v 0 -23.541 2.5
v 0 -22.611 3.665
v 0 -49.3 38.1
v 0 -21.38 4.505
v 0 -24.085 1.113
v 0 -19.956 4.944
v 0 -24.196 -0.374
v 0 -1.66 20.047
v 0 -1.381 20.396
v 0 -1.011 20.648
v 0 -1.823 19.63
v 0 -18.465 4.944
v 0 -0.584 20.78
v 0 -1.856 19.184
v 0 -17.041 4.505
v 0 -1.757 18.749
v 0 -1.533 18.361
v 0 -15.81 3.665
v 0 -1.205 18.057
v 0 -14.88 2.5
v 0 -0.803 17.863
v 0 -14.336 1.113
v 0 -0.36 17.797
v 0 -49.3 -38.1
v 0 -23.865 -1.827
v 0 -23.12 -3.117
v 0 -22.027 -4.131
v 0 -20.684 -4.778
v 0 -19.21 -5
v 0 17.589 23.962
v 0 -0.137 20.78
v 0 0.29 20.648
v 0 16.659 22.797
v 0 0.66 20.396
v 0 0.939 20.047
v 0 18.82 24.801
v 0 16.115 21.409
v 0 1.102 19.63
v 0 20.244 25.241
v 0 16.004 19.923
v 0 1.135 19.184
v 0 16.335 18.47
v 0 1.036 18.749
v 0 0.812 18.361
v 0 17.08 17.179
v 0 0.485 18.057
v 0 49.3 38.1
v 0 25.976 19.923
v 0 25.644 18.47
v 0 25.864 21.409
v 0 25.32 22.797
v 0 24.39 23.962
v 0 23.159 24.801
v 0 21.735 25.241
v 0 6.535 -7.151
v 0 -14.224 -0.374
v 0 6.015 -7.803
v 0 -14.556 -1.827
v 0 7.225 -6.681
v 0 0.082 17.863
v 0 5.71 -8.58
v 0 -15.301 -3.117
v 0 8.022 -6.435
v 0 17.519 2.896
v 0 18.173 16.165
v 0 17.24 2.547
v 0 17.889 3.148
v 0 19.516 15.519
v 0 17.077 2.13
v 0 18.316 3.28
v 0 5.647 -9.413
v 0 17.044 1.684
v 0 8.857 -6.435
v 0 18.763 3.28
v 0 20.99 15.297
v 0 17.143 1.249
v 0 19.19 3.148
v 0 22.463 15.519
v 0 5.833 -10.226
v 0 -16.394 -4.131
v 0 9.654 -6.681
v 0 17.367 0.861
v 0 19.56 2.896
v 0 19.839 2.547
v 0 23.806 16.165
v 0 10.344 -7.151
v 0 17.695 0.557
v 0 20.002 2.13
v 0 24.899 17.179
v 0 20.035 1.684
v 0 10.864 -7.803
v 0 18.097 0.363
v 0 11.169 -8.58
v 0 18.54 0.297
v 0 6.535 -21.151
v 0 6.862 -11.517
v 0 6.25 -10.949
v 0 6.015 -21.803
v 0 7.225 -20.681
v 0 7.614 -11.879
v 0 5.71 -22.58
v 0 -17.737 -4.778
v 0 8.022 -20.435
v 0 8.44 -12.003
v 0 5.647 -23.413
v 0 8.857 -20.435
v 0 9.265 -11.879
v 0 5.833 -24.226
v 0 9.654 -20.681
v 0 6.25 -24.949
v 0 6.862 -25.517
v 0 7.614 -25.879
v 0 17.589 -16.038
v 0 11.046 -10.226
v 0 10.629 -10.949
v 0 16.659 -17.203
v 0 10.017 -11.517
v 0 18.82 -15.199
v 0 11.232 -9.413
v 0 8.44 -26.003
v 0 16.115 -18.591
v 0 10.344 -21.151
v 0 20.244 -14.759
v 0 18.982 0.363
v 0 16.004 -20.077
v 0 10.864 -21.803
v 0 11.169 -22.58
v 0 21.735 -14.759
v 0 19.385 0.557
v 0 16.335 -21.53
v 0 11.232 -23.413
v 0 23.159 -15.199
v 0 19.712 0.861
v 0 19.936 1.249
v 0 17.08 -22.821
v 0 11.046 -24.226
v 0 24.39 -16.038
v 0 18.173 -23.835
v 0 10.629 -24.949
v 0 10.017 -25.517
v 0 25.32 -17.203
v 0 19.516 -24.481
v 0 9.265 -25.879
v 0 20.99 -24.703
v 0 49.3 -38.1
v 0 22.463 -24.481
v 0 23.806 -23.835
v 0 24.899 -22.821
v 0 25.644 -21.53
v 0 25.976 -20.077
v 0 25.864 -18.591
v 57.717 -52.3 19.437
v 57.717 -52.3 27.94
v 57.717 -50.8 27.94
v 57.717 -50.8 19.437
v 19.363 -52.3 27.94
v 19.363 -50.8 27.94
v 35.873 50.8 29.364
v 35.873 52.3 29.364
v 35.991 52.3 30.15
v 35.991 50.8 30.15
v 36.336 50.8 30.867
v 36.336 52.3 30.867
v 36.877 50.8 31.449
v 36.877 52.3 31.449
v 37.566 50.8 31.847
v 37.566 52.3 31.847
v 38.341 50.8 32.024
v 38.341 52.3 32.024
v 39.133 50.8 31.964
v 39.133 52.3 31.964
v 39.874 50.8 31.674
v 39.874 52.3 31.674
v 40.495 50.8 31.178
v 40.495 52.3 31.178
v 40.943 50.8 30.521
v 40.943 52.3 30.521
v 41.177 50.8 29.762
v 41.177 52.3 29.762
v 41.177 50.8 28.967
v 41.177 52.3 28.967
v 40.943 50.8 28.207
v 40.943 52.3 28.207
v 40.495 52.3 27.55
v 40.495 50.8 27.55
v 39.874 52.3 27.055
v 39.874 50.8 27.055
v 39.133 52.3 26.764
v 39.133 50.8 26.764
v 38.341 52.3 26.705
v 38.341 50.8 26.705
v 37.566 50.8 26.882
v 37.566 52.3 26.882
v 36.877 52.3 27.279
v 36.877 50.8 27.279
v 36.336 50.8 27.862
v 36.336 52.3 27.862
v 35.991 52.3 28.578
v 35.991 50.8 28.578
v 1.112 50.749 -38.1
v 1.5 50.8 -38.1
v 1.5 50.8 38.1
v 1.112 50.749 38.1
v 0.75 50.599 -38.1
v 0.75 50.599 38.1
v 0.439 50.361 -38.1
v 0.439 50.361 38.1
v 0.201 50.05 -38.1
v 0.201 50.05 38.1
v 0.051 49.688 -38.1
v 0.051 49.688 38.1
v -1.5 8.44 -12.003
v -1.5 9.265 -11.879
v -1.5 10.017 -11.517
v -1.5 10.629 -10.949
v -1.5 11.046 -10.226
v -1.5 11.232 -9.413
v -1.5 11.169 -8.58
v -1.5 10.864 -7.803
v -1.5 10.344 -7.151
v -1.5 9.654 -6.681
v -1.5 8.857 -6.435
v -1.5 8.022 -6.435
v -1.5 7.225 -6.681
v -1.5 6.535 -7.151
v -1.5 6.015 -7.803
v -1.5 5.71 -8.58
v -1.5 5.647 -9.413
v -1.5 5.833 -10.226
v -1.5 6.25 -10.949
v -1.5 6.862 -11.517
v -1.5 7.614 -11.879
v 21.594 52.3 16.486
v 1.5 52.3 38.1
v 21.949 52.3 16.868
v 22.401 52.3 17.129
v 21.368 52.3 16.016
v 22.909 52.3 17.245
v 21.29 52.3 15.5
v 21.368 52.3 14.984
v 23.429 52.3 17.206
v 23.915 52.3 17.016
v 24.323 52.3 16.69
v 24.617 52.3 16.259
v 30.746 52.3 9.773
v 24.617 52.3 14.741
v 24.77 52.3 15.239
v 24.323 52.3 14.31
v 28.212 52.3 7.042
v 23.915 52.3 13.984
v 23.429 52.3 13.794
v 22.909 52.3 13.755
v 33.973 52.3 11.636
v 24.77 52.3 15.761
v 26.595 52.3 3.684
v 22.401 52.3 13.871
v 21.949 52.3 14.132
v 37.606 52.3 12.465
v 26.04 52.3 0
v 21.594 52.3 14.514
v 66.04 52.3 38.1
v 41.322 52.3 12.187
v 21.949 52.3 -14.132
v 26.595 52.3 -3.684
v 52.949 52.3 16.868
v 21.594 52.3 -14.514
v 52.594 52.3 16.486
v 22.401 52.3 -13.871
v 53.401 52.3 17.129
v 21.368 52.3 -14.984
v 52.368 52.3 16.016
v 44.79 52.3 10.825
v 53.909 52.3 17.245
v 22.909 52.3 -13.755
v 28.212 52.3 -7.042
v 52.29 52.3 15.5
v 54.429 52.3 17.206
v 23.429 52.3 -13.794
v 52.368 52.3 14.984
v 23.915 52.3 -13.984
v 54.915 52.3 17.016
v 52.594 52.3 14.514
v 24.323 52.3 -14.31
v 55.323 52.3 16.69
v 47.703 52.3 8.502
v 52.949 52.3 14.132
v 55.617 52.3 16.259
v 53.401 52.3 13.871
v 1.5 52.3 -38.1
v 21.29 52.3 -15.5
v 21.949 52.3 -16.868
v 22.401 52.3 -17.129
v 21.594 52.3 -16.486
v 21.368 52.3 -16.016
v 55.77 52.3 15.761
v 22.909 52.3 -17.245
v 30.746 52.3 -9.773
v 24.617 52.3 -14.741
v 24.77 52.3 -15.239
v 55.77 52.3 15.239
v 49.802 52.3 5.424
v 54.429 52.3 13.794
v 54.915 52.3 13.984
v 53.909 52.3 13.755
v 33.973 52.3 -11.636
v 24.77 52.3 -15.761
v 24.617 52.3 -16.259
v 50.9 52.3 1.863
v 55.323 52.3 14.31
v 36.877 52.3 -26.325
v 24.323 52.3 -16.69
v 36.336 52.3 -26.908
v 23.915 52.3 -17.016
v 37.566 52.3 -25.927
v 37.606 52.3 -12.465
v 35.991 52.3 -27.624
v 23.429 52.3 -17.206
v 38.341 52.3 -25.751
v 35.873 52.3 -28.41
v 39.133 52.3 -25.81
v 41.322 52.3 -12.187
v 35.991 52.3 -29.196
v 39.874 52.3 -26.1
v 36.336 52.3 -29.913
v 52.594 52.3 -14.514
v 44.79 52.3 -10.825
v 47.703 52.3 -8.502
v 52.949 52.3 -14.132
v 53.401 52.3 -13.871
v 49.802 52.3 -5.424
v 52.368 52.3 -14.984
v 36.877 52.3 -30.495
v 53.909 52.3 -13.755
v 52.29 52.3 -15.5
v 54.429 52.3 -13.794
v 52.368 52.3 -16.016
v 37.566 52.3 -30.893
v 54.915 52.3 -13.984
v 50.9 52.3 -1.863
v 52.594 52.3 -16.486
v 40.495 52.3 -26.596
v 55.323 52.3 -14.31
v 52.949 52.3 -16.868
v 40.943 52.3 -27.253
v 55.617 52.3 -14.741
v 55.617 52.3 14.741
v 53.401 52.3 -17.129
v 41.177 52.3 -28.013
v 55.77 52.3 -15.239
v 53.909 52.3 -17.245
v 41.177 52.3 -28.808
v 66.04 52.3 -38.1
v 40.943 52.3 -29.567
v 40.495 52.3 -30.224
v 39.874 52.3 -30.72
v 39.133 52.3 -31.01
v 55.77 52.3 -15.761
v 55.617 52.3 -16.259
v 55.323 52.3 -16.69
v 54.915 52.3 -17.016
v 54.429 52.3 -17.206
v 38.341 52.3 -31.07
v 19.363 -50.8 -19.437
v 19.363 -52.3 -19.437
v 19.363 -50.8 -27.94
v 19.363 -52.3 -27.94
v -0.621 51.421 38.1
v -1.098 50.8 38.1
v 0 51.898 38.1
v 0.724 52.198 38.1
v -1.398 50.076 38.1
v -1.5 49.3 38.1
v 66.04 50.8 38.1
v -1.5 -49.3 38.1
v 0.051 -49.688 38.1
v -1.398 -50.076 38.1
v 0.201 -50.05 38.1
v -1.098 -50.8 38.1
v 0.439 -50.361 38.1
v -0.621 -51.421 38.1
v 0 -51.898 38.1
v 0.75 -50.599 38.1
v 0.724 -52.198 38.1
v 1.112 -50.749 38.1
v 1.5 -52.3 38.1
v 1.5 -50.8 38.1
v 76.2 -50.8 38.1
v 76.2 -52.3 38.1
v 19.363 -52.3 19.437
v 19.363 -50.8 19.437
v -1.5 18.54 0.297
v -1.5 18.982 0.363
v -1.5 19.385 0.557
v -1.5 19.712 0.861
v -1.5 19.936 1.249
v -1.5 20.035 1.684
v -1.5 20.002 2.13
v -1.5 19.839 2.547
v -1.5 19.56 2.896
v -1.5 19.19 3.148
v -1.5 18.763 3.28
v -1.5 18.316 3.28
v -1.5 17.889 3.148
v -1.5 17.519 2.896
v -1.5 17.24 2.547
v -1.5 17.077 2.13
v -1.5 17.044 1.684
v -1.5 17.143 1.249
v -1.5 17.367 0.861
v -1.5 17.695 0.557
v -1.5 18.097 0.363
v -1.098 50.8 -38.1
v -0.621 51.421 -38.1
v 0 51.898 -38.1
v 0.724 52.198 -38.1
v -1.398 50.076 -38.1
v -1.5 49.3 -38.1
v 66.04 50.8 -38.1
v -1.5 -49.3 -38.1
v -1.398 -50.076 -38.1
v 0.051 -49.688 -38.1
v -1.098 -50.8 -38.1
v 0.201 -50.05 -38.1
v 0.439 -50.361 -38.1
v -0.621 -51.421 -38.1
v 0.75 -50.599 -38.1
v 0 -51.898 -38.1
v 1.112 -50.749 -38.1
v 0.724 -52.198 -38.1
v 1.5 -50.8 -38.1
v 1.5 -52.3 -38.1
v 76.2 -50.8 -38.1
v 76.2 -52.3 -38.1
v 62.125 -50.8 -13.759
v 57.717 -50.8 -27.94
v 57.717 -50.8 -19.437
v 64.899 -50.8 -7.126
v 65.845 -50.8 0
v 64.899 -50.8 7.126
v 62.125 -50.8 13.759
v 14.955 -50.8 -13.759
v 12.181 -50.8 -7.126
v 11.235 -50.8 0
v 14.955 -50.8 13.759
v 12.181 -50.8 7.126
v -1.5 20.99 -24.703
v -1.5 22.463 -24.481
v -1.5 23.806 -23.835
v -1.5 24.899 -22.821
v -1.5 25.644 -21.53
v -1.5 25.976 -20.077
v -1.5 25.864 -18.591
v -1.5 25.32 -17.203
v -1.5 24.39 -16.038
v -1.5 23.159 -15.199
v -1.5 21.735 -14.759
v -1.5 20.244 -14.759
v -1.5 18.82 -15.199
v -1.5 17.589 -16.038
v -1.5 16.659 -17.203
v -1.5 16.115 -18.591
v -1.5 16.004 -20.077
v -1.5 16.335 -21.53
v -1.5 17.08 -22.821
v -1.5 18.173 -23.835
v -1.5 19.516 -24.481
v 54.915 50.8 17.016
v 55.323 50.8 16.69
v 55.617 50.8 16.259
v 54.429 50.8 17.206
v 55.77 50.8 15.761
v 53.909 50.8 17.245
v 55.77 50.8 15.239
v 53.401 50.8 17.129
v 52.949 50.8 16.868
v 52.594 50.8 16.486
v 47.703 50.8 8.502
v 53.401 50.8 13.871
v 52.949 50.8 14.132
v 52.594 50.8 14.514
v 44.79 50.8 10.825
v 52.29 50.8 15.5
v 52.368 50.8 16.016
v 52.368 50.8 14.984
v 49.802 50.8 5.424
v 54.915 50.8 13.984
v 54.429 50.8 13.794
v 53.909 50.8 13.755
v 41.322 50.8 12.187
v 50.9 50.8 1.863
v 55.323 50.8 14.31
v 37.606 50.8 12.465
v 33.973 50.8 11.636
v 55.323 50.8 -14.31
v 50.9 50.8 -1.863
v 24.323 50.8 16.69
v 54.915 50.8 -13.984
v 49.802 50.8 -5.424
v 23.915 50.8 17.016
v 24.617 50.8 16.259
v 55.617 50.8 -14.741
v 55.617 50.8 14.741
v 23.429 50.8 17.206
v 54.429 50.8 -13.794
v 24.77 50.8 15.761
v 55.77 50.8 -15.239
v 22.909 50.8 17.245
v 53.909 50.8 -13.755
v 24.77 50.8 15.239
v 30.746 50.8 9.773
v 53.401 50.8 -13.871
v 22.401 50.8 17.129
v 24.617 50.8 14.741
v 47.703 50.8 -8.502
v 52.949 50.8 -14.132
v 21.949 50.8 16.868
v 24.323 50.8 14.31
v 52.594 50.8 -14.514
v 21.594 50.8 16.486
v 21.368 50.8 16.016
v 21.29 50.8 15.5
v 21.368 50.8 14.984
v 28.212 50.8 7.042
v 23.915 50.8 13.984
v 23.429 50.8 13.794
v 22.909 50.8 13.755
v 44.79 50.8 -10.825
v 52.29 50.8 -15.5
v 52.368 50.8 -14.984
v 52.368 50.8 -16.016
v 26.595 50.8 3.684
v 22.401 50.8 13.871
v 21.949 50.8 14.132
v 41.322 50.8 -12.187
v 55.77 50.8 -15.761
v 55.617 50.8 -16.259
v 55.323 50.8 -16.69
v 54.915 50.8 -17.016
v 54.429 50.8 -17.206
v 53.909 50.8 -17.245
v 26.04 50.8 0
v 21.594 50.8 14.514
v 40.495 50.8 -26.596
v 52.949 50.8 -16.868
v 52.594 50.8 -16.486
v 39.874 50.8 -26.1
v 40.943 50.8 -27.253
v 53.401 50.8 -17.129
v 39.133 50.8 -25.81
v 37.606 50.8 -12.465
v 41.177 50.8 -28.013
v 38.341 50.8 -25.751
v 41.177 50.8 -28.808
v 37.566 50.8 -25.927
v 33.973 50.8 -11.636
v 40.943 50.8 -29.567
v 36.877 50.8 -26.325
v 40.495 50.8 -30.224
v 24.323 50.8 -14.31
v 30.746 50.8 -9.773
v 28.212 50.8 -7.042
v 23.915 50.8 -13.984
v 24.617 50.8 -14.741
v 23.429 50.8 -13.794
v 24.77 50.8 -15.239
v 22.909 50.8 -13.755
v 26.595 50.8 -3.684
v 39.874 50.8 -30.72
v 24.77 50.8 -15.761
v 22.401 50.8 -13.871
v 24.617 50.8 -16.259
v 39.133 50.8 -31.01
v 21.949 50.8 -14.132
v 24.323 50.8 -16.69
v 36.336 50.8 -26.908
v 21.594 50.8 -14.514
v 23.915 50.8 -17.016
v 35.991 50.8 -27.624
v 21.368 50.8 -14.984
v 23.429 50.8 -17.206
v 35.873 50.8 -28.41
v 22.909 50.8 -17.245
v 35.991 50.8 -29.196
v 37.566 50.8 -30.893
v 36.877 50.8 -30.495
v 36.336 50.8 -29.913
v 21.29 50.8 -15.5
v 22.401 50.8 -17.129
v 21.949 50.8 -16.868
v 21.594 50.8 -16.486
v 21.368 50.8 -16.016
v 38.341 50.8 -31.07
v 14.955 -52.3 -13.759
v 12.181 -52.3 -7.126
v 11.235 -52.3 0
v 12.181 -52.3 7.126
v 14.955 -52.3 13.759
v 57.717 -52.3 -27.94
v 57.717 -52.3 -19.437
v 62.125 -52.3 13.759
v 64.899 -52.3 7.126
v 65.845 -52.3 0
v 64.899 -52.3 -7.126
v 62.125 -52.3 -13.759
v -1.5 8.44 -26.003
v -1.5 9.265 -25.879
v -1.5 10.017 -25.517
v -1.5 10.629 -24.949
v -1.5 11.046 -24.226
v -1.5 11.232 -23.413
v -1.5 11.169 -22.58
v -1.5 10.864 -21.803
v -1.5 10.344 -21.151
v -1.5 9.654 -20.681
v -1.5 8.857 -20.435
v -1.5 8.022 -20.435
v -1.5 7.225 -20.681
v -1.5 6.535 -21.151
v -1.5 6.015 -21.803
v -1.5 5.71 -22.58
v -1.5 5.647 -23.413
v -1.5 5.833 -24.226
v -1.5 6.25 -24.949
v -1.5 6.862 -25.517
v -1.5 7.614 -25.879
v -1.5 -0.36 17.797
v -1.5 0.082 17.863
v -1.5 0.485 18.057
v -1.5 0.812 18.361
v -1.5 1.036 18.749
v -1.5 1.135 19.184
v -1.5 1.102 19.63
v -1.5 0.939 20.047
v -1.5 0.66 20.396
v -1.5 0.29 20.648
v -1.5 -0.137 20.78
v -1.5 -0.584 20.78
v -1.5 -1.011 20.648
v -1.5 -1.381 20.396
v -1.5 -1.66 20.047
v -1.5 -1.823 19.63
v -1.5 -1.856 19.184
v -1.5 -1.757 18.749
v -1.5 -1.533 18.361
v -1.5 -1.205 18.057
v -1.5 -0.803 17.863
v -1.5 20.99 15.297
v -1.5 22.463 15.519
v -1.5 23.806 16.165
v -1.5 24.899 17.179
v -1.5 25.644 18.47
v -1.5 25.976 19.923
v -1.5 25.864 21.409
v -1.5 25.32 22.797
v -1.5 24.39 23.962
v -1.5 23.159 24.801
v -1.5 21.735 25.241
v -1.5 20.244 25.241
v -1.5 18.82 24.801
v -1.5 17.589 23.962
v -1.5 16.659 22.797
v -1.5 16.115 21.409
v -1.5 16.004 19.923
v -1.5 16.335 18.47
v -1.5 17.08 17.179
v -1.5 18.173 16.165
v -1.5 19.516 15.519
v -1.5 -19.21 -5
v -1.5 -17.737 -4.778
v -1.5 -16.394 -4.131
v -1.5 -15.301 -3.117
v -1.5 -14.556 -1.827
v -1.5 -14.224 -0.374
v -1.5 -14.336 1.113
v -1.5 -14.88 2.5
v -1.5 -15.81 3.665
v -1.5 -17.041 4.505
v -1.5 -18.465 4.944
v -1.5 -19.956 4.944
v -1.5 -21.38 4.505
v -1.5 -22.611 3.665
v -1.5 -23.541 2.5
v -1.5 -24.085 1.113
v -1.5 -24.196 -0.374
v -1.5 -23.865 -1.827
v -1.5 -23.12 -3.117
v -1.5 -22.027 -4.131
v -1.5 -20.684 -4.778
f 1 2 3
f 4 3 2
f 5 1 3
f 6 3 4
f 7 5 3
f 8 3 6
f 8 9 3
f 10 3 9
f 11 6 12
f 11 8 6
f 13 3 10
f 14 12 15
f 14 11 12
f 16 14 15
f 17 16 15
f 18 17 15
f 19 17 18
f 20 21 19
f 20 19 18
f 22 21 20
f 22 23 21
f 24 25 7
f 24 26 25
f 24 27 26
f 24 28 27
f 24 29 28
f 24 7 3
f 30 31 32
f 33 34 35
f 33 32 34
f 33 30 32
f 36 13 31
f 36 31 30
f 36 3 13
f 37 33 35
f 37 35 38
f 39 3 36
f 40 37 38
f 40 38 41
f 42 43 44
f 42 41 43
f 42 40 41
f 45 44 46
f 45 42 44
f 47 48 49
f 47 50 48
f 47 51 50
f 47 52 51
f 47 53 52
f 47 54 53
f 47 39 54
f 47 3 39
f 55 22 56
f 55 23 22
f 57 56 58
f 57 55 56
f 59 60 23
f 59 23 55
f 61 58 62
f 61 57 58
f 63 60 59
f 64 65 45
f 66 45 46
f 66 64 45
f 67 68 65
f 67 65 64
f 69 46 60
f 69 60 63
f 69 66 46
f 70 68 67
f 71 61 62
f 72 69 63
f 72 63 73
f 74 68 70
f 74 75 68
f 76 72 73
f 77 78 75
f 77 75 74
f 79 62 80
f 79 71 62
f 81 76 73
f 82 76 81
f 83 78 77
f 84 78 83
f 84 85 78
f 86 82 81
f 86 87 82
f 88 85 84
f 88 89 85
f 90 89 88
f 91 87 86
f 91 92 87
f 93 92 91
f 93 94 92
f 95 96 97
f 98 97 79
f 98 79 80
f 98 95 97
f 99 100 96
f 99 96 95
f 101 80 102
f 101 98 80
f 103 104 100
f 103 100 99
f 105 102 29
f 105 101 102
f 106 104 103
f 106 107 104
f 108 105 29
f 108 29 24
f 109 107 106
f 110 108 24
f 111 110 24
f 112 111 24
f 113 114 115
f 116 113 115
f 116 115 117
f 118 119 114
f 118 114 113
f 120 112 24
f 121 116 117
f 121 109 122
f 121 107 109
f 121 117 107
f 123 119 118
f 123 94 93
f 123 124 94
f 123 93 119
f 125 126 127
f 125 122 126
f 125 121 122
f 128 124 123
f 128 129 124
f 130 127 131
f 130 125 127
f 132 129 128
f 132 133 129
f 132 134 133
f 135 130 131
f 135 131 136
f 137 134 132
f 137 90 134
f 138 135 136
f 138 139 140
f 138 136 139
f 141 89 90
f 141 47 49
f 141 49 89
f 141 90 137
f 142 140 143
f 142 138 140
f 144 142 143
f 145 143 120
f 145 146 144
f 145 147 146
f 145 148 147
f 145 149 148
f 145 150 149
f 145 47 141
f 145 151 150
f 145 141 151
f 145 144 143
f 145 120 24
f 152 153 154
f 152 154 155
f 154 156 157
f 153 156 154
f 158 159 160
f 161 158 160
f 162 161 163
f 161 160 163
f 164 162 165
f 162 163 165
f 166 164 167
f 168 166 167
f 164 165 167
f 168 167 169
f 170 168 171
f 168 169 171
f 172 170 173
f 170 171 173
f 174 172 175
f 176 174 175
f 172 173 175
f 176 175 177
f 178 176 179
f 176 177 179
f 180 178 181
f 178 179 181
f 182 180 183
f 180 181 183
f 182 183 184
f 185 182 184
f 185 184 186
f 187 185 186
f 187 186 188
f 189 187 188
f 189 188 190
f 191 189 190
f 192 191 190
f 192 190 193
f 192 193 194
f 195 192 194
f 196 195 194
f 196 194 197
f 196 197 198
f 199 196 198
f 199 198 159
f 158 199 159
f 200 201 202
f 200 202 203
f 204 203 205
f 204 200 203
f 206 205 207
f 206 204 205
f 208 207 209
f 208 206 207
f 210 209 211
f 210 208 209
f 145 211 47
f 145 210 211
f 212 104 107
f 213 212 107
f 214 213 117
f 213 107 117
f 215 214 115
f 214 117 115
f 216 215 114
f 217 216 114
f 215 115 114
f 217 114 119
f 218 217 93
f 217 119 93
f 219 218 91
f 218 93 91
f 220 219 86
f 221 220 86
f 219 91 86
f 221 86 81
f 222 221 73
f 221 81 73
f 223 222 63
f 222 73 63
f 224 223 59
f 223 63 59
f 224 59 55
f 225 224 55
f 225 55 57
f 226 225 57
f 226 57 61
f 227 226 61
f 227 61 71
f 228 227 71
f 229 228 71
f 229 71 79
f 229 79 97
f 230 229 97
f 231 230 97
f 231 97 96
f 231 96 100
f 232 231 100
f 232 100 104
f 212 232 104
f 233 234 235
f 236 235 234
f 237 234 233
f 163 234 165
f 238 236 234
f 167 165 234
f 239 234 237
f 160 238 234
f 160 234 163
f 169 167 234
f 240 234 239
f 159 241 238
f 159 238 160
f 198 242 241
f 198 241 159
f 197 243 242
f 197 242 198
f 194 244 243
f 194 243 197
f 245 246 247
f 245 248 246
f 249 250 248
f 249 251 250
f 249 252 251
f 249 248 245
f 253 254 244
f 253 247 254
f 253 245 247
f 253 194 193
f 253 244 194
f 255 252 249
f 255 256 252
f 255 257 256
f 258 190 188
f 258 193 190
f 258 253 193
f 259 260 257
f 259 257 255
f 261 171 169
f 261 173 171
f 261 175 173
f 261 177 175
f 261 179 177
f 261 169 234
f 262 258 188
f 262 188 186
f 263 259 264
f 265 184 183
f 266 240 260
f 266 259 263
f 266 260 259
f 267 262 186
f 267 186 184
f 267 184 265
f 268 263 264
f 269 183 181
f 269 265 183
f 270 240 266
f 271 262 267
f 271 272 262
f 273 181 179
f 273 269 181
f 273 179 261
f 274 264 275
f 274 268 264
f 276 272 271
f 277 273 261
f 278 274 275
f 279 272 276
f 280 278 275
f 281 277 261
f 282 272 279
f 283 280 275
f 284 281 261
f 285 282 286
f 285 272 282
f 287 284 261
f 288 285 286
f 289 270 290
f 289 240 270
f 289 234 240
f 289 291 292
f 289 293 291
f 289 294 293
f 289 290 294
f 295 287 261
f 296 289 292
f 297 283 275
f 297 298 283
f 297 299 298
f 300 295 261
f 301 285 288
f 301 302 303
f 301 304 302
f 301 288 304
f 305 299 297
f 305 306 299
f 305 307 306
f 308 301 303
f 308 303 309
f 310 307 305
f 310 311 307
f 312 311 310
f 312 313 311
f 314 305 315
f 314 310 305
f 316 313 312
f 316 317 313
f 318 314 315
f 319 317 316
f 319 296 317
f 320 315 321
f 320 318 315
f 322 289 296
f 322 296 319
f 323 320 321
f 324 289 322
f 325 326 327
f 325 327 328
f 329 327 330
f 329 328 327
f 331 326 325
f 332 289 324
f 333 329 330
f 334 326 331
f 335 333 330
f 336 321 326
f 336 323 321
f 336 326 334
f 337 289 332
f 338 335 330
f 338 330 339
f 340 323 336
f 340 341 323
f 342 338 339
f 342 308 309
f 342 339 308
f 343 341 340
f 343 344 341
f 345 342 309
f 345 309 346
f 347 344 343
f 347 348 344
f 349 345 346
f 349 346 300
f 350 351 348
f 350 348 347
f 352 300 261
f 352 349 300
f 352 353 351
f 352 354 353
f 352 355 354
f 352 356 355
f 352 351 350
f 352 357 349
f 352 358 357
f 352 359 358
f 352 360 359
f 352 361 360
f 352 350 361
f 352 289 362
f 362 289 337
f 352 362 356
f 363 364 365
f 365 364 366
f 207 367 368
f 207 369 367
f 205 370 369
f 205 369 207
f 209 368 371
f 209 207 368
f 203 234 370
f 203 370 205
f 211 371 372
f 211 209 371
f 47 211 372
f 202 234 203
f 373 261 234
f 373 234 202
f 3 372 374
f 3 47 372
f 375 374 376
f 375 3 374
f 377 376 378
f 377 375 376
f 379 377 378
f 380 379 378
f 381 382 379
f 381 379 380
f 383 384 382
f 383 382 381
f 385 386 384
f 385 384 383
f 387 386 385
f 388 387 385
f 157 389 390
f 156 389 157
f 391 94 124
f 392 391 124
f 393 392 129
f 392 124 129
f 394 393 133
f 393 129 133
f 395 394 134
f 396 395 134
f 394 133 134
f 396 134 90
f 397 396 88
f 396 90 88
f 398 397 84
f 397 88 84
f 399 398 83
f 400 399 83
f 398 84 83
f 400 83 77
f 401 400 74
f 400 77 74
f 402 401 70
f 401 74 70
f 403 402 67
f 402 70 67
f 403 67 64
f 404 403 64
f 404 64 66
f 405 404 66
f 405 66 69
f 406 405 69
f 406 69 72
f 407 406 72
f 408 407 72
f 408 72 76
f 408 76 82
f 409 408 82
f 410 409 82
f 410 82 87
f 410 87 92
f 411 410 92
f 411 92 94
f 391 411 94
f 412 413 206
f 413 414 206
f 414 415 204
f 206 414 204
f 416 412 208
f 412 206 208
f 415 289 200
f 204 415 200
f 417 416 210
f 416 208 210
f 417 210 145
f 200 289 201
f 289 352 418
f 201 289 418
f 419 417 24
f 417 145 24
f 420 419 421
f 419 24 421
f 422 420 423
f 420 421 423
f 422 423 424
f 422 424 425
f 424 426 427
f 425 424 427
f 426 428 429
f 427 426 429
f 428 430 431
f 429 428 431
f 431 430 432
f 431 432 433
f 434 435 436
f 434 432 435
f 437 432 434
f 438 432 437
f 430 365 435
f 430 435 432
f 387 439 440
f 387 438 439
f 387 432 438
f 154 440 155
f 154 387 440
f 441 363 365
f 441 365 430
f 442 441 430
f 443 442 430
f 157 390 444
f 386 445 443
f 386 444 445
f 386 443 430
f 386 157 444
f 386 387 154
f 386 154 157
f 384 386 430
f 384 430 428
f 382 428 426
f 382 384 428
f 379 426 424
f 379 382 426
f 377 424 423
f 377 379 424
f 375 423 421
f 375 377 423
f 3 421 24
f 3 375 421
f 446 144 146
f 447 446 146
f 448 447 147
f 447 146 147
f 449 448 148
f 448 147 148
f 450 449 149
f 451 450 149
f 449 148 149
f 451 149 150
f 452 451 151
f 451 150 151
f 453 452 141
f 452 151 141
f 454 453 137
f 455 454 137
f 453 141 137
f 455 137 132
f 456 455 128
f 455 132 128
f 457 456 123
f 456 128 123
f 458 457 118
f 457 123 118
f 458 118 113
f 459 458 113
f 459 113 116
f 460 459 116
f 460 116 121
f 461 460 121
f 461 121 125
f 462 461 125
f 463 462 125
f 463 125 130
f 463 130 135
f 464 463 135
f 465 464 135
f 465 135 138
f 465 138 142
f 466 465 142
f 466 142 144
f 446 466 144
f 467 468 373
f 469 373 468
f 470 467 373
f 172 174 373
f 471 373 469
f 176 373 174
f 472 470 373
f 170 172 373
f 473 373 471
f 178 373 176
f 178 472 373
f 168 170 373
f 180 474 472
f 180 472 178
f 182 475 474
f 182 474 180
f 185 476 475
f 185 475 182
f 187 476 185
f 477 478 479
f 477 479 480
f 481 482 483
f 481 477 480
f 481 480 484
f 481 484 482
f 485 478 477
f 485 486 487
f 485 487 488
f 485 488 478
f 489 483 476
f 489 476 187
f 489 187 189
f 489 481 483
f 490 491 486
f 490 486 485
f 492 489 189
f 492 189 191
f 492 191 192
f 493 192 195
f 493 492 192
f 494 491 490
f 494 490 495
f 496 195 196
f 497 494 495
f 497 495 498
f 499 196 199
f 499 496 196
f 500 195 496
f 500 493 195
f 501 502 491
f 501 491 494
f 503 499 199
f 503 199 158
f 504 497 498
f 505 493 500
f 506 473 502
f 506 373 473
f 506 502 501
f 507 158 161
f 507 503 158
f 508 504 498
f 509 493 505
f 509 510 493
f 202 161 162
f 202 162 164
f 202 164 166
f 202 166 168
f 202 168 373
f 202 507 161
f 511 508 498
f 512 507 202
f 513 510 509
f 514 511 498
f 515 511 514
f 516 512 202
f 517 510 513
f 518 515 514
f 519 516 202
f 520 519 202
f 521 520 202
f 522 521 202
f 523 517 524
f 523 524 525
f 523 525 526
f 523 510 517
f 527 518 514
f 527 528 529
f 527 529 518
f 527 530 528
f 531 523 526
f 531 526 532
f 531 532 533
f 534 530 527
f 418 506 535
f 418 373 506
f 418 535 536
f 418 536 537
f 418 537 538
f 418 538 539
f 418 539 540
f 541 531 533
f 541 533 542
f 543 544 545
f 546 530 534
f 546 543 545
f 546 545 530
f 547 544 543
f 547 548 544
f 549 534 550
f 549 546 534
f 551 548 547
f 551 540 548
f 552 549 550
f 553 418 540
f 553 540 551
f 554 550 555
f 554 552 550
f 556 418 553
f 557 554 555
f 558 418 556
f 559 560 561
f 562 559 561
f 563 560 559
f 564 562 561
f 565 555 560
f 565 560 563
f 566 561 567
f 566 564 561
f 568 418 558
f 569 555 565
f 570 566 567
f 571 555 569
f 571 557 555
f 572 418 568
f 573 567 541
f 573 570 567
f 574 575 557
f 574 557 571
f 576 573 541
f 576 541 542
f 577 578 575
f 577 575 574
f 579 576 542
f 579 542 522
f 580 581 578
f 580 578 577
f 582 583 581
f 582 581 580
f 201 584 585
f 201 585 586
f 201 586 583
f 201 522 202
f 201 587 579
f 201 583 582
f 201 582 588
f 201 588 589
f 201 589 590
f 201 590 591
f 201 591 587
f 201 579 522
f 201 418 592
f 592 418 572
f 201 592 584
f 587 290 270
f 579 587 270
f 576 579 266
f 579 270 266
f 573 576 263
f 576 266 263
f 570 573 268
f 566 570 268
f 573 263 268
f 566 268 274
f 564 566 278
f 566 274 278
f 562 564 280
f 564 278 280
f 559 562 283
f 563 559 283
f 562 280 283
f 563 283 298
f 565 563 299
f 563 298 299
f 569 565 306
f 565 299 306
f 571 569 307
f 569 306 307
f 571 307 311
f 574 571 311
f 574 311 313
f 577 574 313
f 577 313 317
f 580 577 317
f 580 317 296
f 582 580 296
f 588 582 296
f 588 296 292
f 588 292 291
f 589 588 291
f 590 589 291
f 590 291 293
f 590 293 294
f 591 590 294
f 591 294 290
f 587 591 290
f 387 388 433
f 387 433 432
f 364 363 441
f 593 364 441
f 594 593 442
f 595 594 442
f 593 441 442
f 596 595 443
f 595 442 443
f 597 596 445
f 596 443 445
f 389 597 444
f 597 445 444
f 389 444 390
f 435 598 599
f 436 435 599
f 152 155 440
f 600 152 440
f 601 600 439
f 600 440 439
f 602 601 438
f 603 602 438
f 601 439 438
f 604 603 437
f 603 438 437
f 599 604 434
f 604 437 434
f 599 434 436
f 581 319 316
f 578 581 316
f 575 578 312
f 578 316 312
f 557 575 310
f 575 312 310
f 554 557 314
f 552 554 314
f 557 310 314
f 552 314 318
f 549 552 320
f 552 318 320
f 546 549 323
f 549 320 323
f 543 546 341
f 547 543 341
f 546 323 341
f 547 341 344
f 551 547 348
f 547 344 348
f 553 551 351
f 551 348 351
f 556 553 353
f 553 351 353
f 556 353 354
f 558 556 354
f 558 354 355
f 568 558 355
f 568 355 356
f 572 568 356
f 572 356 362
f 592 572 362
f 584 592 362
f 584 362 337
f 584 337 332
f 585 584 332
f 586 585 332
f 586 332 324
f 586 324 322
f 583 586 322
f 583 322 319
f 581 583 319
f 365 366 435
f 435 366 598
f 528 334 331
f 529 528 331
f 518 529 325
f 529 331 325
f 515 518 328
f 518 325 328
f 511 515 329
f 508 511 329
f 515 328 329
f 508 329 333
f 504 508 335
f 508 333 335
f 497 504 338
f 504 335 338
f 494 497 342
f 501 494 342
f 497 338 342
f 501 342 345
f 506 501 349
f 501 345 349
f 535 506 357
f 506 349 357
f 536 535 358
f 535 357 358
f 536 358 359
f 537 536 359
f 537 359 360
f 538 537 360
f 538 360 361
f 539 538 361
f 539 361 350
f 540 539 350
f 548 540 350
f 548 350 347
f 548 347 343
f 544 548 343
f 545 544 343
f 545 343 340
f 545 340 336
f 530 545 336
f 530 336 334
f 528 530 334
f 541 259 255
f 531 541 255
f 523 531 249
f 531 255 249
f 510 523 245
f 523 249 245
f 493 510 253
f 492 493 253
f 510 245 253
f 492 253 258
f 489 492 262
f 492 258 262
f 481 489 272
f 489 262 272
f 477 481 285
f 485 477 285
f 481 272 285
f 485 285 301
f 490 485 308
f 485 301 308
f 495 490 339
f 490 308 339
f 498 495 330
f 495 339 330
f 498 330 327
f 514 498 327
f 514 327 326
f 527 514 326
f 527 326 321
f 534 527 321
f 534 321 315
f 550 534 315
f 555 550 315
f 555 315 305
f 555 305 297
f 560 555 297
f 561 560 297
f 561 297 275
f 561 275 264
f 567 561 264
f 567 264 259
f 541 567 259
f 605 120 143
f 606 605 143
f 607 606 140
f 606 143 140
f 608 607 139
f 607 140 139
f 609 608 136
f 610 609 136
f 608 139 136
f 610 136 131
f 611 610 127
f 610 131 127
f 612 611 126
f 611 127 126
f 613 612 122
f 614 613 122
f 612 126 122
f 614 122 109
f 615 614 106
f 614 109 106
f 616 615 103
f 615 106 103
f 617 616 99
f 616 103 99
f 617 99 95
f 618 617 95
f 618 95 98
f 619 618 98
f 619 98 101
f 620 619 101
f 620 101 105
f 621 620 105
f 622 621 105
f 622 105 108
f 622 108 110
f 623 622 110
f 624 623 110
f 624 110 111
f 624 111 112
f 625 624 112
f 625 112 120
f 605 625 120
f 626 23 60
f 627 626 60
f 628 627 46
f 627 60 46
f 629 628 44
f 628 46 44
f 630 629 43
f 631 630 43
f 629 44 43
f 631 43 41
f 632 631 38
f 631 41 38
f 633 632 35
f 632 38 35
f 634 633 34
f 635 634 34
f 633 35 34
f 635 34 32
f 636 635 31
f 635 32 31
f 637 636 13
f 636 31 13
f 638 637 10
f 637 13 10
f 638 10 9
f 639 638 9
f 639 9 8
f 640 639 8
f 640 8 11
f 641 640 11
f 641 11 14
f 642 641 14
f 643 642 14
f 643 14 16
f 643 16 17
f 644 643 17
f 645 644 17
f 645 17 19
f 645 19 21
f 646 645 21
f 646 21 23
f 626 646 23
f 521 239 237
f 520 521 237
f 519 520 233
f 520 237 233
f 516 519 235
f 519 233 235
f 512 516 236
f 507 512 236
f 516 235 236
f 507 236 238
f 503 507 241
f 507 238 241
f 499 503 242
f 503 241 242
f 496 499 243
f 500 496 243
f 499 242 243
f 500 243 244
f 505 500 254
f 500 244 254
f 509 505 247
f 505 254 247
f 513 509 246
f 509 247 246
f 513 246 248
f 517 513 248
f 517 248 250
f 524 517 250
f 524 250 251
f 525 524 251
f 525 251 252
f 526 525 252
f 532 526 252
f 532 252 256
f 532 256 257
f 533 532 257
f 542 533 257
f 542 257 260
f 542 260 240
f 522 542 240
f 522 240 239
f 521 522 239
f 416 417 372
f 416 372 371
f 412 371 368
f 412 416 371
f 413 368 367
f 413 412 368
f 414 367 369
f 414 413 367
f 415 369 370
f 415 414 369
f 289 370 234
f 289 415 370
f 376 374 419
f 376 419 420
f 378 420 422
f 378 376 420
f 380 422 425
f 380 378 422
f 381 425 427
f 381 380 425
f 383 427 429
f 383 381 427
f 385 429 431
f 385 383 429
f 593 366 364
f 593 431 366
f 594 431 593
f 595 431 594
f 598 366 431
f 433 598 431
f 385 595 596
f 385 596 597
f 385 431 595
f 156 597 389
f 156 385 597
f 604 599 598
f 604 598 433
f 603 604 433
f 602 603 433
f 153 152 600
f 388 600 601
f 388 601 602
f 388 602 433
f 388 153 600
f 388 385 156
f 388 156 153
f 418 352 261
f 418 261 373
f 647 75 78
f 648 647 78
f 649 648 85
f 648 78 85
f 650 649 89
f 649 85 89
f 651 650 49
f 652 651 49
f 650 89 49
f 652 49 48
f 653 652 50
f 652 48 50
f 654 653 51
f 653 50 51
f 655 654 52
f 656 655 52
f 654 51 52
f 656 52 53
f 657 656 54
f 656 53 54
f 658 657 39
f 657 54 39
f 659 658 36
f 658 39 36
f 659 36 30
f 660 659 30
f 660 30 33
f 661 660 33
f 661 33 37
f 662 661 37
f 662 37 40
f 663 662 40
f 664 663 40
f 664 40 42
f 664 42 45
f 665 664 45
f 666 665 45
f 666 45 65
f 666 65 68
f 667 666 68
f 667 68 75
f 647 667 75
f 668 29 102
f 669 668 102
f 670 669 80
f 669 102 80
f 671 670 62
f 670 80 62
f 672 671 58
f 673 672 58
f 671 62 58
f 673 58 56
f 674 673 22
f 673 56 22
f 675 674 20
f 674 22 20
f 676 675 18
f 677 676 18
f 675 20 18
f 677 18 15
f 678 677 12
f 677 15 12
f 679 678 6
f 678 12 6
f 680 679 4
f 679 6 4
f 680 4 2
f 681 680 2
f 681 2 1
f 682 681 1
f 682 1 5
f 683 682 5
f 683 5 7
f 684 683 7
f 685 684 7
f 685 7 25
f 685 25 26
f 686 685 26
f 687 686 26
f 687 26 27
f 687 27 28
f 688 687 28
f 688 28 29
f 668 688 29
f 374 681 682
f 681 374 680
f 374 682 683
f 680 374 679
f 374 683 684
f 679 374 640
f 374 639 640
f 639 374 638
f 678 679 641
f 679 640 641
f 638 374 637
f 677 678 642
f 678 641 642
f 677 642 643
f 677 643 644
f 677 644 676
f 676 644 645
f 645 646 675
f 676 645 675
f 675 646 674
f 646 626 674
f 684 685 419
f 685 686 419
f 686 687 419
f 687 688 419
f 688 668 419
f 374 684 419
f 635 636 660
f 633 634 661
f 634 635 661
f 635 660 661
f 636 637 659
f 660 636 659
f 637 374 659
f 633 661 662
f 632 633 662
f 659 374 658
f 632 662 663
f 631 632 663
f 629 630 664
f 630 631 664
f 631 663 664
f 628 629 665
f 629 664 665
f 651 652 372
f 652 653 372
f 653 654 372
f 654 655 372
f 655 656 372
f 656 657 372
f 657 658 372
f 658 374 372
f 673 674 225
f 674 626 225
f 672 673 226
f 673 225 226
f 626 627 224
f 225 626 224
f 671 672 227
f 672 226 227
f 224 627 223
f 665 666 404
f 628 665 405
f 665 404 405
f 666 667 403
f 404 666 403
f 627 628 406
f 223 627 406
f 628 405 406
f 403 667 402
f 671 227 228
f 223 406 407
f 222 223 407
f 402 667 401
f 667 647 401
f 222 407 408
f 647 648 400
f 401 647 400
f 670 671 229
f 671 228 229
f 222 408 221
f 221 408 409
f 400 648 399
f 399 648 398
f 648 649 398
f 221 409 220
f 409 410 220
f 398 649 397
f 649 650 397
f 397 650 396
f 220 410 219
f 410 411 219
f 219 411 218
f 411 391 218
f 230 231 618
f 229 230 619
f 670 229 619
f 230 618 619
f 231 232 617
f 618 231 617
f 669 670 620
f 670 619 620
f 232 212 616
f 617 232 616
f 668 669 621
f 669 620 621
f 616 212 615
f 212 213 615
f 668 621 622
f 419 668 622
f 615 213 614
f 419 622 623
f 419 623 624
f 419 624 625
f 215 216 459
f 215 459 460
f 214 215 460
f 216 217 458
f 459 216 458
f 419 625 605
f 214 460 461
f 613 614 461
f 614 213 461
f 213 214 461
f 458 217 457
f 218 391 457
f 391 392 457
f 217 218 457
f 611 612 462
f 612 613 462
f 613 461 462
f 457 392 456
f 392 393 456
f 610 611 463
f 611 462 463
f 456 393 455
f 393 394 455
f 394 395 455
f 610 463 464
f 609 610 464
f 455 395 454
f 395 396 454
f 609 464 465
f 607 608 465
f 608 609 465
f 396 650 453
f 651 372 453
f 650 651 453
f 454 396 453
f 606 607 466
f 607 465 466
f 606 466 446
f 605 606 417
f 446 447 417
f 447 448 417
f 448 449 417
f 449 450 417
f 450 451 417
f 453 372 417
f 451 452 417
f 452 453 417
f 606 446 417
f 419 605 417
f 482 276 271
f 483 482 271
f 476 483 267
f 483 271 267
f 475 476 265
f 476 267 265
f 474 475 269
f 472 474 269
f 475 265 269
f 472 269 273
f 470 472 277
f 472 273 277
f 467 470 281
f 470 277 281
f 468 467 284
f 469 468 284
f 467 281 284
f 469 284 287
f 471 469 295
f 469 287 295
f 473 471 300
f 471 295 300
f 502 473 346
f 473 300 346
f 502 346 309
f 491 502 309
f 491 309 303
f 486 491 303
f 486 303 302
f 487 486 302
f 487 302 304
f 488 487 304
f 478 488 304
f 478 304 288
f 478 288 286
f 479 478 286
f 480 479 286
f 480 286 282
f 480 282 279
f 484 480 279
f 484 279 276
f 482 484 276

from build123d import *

# Parameters (mm, degrees)
SKETCH63_W                     = 76.2
SKETCH63_H                     = 101.6
BRACKET_INTERFACE_DEPTH        = 1.5
SKETCH57_R                     = 2.8
SKETCH57_R_2                   = 1.5
SKETCH57_R_3                   = 5
CUT_EXTRUDE7_DEPTH             = 2.54
STEPPER_FLANGE_STRIP_W         = 9
STEPPER_FLANGE_STRIP_H         = 1.5
STEPPER_FLANGE_STRIP_CUT_DEPTH = 76.2
STEPPER_FLANGE_DEPTH           = 76.2
BARREL_FLANGE_STRIP_W          = 9
BARREL_FLANGE_STRIP_H          = 1.5
BARREL_FLANGE_STRIP_CUT_DEPTH  = 76.2
BARREL_FLANGE_DEPTH            = 76.2
SKETCH75_R                     = 1.75
SKETCH75_R_2                   = 12.5
NEMA_17_PATTERN_DEPTH          = 2.54
SKETCH82_R                     = 27.305
CUT_EXTRUDE8_DEPTH             = 5
CUT_EXTRUDE17_REACH            = 136.904
CUT_EXTRUDE18_REACH            = 136.904
SKETCH145_R                    = 2.667


# Sheet-metal steps are written as plain solids
with BuildPart() as part:
    # Sketch63 → Bracket_Interface (new body)
    with BuildSketch(Plane(origin=(0, 0, 0), x_dir=(0, 0, -1), z_dir=(1, 0, 0))):
        Rectangle(SKETCH63_W, SKETCH63_H)
    extrude(amount=-BRACKET_INTERFACE_DEPTH)

    # Sketch57 → Cut-Extrude7 (cut)
    # profile 1 of 7: a face of its own
    with BuildSketch(Plane(origin=(0, 0, 0), x_dir=(0, 0, -1), z_dir=(1, 0, 0))):
        with Locations((9.203487694, 8.439536918)):
            Circle(SKETCH57_R)
        with Locations((9.203487694, 8.439536918)):
            Circle(SKETCH57_R_2, mode=Mode.SUBTRACT)
    # profile 2 of 7: a face of its own
    with BuildSketch(Plane(origin=(0, 0, 0), x_dir=(0, 0, -1), z_dir=(1, 0, 0))):
        with Locations((23.203487694, 8.439536918)):
            Circle(SKETCH57_R)
        with Locations((23.203487694, 8.439536918)):
            Circle(SKETCH57_R_2, mode=Mode.SUBTRACT)
    # profile 3 of 7: a face of its own
    with BuildSketch(Plane(origin=(0, 0, 0), x_dir=(0, 0, -1), z_dir=(1, 0, 0))):
        with Locations((0, -19.210463082)):
            Circle(SKETCH57_R_3)
    # profile 4 of 7: a face of its own
    with BuildSketch(Plane(origin=(0, 0, 0), x_dir=(0, 0, -1), z_dir=(1, 0, 0))):
        with Locations((-19.296512306, -0.360463082)):
            Circle(SKETCH57_R_2)
    # profile 5 of 7: a face of its own
    with BuildSketch(Plane(origin=(0, 0, 0), x_dir=(0, 0, -1), z_dir=(1, 0, 0))):
        with Locations((-1.796512306, 18.539536918)):
            Circle(SKETCH57_R_2)
    # profile 6 of 7: a face of its own
    with BuildSketch(Plane(origin=(0, 0, 0), x_dir=(0, 0, -1), z_dir=(1, 0, 0))):
        with Locations((19.703487694, 20.989536918)):
            Circle(SKETCH57_R_3)
    # profile 7 of 7: a face of its own
    with BuildSketch(Plane(origin=(0, 0, 0), x_dir=(0, 0, -1), z_dir=(1, 0, 0))):
        with Locations((-20.296512306, 20.989536918)):
            Circle(SKETCH57_R_3)
    extrude(amount=-CUT_EXTRUDE7_DEPTH, mode=Mode.SUBTRACT)


with BuildPart() as body_2:
    # of the pieces the cut leaves, the one that is kept (cut_extrude7_keep)
    add(part.part.solids().sort_by_distance((0, 50.8, 38.1))[0])

    # Stepper_Flange strip (across the edge) → Stepper_Flange strip cut (cut)
    with BuildSketch(Plane(origin=(0, 50.8, -38.1), x_dir=(0, -1, 0), z_dir=(0, 0, 1))):
        with Locations((-3, -0.75)):
            Rectangle(STEPPER_FLANGE_STRIP_W, STEPPER_FLANGE_STRIP_H)
    extrude(amount=STEPPER_FLANGE_STRIP_CUT_DEPTH, mode=Mode.SUBTRACT)

    # Stepper_Flange section (across the edge) → Stepper_Flange (add)
    with BuildSketch(Plane(origin=(0, 50.8, -38.1), x_dir=(0, -1, 0), z_dir=(0, 0, 1))):
        with BuildLine():
            Line((-1.5, 1.5), (-1.5, 66.04))
            Line((-1.5, 66.04), (0, 66.04))
            Line((0, 66.04), (0, 1.5))
            ThreePointArc((0, 1.5), (0.439339828, 0.439339828), (1.5, 0))
            Line((1.5, 0), (1.5, -1.5))
            ThreePointArc((1.5, -1.5), (-0.621320344, -0.621320344), (-1.5, 1.5))
        make_face()
    extrude(amount=STEPPER_FLANGE_DEPTH)

    # Barrel_Flange strip (across the edge) → Barrel_Flange strip cut (cut)
    with BuildSketch(Plane(origin=(0, -50.8, 38.1), x_dir=(0, 1, 0), z_dir=(0, 0, -1))):
        with Locations((-3, -0.75)):
            Rectangle(BARREL_FLANGE_STRIP_W, BARREL_FLANGE_STRIP_H)
    extrude(amount=BARREL_FLANGE_STRIP_CUT_DEPTH, mode=Mode.SUBTRACT)

    # Barrel_Flange section (across the edge) → Barrel_Flange (add)
    with BuildSketch(Plane(origin=(0, -50.8, 38.1), x_dir=(0, 1, 0), z_dir=(0, 0, -1))):
        with BuildLine():
            Line((-1.5, 1.5), (-1.5, 76.2))
            Line((-1.5, 76.2), (0, 76.2))
            Line((0, 76.2), (0, 1.5))
            ThreePointArc((0, 1.5), (0.439339828, 0.439339828), (1.5, 0))
            Line((1.5, 0), (1.5, -1.5))
            ThreePointArc((1.5, -1.5), (-0.621320344, -0.621320344), (-1.5, 1.5))
        make_face()
    extrude(amount=BARREL_FLANGE_DEPTH)

    # Sketch75 → NEMA_17_Pattern (cut)
    with BuildSketch(Plane(origin=(0, 52.3, 0), x_dir=(1, 0, 0), z_dir=(0, 1, 0))):
        with Locations(Location((23.04, 15.5, 0), (0, 0, 180))):
            Circle(SKETCH75_R)
        with Locations(Location((54.04, 15.5, 0), (0, 0, 180))):
            Circle(SKETCH75_R)
        with Locations(Location((54.04, -15.5, 0), (0, 0, 180))):
            Circle(SKETCH75_R)
        with Locations(Location((23.04, -15.5, 0), (0, 0, 180))):
            Circle(SKETCH75_R)
        with Locations(Location((38.54, 0, 0), (0, 0, 180))):
            Circle(SKETCH75_R_2)
    extrude(amount=-NEMA_17_PATTERN_DEPTH, mode=Mode.SUBTRACT)

    # Sketch82 → Cut-Extrude8 (cut)
    with BuildSketch(Plane(origin=(0, -50.8, 0), x_dir=(1, 0, 0), z_dir=(0, 1, 0))):
        with Locations(Location((38.54, 0, 0), (0, 0, 180))):
            Circle(SKETCH82_R)
    extrude(amount=-CUT_EXTRUDE8_DEPTH, mode=Mode.SUBTRACT)

    # Sketch142 → Cut-Extrude17 (cut, up to next)
    with BuildSketch(Plane.XZ.offset(52.3), mode=Mode.PRIVATE) as cut_extrude17_sk1:
        with BuildLine():
            Line((19.363, 19.437224493), (19.363, 27.94))
            Line((19.363, 27.94), (57.717, 27.94))
            Line((57.717, 27.94), (57.717, 19.437224493))
            ThreePointArc((57.717, 19.437224493), (38.54, 27.305), (19.363, 19.437224493))
        make_face()
    cut_extrude17_tool1 = extrude(cut_extrude17_sk1.sketch, amount=-CUT_EXTRUDE17_REACH, mode=Mode.PRIVATE) & body_2.part
    cut_extrude17 = cut_extrude17_tool1.solids().sort_by_distance((38.54, -52.3, 27.697852))[0]
    add(cut_extrude17, mode=Mode.SUBTRACT)

    # Mirror1: Cut-Extrude17 across plane
    add(cut_extrude17.mirror(Plane.XY), mode=Mode.SUBTRACT)

    # Sketch145 → Cut-Extrude18 (cut, up to next)
    with BuildSketch(Plane(origin=(0, 52.3, 0), x_dir=(1, 0, 0), z_dir=(0, 1, 0)), mode=Mode.PRIVATE) as cut_extrude18_sk1:
        with Locations(Location((38.54, 28.410128662, 0), (0, 0, 180))):
            Circle(SKETCH145_R)
    cut_extrude18_tool1 = extrude(cut_extrude18_sk1.sketch, amount=-CUT_EXTRUDE18_REACH, mode=Mode.PRIVATE) & body_2.part
    # Sketch145 → Cut-Extrude18 (cut, up to next)
    with BuildSketch(Plane(origin=(0, 52.3, 0), x_dir=(1, 0, 0), z_dir=(0, 1, 0)), mode=Mode.PRIVATE) as cut_extrude18_sk2:
        with Locations(Location((38.54, -29.364200147, 0), (0, 0, 180))):
            Circle(SKETCH145_R)
    cut_extrude18_tool2 = extrude(cut_extrude18_sk2.sketch, amount=-CUT_EXTRUDE18_REACH, mode=Mode.PRIVATE) & body_2.part
    add(cut_extrude18_tool1.solids().sort_by_distance((38.54, 52.3, -28.410129))[0], mode=Mode.SUBTRACT)
    add(cut_extrude18_tool2.solids().sort_by_distance((38.54, 52.3, 29.3642))[0], mode=Mode.SUBTRACT)


solid = body_2.part
